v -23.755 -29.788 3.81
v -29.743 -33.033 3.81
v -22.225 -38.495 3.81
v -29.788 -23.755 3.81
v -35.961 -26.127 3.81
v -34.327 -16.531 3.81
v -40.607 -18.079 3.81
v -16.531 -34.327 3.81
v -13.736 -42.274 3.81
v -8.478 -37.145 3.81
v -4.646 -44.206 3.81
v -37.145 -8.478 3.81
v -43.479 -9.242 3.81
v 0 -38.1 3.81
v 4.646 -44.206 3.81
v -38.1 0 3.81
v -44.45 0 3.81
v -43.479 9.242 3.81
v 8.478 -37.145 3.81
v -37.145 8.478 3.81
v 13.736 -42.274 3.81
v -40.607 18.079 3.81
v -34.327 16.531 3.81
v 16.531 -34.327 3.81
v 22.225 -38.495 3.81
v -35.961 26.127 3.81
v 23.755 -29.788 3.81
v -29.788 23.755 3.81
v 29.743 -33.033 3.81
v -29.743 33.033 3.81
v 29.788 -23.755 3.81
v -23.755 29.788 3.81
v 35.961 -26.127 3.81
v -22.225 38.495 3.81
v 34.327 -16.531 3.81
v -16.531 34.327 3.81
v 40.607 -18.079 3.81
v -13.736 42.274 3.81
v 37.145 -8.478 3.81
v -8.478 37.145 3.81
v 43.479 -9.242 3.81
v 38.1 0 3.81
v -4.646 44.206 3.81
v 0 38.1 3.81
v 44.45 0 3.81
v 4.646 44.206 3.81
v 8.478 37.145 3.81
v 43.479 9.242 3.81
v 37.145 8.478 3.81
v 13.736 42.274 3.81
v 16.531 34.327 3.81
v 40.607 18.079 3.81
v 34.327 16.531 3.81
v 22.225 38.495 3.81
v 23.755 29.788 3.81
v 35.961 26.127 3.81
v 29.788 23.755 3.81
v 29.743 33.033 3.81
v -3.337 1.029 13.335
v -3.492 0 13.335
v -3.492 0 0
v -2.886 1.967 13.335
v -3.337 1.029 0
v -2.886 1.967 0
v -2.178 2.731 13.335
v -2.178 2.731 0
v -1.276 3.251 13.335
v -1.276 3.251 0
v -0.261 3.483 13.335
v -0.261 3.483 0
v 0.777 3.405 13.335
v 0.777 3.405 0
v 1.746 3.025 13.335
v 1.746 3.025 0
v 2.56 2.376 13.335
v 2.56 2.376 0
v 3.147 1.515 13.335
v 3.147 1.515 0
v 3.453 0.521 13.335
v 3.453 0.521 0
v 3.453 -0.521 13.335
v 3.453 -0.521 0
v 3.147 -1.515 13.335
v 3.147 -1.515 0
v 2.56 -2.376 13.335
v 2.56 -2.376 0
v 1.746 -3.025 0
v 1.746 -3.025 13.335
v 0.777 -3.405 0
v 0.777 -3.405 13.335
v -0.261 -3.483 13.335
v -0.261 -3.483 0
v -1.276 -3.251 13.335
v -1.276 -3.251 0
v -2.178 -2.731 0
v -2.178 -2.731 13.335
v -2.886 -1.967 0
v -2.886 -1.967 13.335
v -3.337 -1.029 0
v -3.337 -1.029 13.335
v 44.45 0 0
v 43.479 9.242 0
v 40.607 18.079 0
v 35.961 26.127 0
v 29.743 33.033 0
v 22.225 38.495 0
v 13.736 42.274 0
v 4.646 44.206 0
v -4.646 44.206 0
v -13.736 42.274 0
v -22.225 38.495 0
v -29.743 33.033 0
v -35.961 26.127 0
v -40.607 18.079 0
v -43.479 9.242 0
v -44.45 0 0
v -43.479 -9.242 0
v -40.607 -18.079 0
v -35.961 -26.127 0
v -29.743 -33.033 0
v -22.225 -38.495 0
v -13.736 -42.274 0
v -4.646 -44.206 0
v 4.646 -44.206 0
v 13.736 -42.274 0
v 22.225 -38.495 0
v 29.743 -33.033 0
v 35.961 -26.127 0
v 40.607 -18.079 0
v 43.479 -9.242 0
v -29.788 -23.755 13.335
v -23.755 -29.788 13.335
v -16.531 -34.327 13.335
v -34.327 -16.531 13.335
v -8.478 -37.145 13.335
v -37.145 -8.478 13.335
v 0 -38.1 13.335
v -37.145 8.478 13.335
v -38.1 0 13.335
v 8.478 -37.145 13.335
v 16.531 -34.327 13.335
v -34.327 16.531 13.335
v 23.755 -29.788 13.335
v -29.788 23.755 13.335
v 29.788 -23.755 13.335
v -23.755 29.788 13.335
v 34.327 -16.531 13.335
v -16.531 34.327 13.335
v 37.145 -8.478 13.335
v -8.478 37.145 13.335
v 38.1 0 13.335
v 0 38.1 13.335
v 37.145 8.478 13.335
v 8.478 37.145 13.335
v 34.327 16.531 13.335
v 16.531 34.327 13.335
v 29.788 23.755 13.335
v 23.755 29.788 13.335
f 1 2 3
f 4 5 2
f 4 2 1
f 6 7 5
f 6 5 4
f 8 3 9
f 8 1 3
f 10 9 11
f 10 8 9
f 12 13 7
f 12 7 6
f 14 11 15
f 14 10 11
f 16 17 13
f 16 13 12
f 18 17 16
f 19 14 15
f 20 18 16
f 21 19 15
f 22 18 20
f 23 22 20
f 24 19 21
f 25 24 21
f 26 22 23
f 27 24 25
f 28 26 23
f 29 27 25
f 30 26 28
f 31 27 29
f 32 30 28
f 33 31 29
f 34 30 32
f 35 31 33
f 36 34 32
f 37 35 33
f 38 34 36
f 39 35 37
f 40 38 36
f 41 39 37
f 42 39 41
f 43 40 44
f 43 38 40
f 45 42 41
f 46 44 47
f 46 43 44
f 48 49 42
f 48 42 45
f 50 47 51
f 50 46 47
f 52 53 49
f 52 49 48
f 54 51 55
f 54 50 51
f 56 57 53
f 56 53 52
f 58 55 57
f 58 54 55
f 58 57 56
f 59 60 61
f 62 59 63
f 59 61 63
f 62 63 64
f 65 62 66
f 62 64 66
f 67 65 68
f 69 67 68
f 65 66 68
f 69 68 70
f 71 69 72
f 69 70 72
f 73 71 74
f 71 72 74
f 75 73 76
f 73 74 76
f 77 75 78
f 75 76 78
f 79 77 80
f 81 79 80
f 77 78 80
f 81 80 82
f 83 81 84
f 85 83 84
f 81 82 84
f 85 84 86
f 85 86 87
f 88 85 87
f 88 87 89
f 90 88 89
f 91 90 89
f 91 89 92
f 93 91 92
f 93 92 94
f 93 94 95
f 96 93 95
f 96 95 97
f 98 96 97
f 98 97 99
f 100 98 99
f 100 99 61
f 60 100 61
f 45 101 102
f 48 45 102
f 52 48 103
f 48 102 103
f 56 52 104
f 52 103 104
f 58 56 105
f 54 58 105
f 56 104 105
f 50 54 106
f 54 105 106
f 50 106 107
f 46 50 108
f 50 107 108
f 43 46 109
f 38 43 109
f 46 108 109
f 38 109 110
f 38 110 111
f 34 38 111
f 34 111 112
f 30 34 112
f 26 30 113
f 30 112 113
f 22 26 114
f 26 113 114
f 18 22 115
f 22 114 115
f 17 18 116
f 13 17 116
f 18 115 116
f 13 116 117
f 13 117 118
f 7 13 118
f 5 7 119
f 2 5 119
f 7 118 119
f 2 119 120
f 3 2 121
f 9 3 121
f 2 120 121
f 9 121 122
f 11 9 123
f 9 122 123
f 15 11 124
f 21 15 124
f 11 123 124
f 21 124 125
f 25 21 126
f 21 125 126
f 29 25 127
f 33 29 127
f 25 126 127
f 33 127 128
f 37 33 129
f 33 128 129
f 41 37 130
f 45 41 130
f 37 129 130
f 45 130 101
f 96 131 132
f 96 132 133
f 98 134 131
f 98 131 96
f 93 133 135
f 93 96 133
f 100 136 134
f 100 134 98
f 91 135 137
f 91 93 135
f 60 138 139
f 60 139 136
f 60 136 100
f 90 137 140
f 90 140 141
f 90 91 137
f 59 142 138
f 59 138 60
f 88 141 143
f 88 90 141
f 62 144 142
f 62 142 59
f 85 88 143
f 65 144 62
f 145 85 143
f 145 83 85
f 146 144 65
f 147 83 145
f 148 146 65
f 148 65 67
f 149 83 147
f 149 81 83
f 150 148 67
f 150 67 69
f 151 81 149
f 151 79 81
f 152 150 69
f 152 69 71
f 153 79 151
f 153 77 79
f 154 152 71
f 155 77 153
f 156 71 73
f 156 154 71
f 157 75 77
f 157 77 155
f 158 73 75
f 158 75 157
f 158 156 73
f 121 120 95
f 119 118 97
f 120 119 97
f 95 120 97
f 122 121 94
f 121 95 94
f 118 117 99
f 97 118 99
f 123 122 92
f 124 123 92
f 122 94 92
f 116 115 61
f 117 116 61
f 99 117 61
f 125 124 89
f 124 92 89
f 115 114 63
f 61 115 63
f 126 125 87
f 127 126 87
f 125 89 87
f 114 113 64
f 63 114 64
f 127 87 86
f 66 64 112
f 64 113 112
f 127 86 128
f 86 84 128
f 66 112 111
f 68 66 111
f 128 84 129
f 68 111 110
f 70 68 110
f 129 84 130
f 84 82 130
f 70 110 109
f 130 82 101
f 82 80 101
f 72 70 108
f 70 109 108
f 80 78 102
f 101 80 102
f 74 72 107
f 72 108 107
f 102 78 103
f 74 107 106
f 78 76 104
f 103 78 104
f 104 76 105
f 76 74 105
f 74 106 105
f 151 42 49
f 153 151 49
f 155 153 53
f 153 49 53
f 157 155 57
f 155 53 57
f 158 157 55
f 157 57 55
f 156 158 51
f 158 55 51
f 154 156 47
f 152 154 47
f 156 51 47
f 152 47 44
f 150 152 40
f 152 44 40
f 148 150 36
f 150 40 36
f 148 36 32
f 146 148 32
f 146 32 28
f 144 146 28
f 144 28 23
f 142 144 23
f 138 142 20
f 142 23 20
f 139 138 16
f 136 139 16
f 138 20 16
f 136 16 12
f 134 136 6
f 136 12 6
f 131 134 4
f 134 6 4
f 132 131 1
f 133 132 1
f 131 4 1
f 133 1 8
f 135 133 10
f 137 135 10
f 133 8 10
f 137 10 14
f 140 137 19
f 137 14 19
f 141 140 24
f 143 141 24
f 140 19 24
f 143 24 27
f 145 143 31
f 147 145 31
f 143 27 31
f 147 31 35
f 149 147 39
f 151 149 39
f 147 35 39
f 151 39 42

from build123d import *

# Parameters (mm, degrees)
F0_R     = 44.45
F1_DEPTH = 3.81
F2_R     = 38.1
F3_DEPTH = 9.525
F5_D     = 6.985


with BuildPart() as f1:
    # F0 (on Top) → F1 (new body)
    with BuildSketch(Plane.XY):
        Circle(F0_R)
    extrude(amount=F1_DEPTH)

    # F2 (on face) → F3 (join)
    with BuildSketch(Plane.XY.offset(3.81)):
        Circle(F2_R)
    extrude(amount=F3_DEPTH)

    # F5 (through all)
    with Locations(Plane.XY.offset(13.335)):
        with Locations((0, 0)):
            Hole(F5_D / 2)


solid = f1.part
